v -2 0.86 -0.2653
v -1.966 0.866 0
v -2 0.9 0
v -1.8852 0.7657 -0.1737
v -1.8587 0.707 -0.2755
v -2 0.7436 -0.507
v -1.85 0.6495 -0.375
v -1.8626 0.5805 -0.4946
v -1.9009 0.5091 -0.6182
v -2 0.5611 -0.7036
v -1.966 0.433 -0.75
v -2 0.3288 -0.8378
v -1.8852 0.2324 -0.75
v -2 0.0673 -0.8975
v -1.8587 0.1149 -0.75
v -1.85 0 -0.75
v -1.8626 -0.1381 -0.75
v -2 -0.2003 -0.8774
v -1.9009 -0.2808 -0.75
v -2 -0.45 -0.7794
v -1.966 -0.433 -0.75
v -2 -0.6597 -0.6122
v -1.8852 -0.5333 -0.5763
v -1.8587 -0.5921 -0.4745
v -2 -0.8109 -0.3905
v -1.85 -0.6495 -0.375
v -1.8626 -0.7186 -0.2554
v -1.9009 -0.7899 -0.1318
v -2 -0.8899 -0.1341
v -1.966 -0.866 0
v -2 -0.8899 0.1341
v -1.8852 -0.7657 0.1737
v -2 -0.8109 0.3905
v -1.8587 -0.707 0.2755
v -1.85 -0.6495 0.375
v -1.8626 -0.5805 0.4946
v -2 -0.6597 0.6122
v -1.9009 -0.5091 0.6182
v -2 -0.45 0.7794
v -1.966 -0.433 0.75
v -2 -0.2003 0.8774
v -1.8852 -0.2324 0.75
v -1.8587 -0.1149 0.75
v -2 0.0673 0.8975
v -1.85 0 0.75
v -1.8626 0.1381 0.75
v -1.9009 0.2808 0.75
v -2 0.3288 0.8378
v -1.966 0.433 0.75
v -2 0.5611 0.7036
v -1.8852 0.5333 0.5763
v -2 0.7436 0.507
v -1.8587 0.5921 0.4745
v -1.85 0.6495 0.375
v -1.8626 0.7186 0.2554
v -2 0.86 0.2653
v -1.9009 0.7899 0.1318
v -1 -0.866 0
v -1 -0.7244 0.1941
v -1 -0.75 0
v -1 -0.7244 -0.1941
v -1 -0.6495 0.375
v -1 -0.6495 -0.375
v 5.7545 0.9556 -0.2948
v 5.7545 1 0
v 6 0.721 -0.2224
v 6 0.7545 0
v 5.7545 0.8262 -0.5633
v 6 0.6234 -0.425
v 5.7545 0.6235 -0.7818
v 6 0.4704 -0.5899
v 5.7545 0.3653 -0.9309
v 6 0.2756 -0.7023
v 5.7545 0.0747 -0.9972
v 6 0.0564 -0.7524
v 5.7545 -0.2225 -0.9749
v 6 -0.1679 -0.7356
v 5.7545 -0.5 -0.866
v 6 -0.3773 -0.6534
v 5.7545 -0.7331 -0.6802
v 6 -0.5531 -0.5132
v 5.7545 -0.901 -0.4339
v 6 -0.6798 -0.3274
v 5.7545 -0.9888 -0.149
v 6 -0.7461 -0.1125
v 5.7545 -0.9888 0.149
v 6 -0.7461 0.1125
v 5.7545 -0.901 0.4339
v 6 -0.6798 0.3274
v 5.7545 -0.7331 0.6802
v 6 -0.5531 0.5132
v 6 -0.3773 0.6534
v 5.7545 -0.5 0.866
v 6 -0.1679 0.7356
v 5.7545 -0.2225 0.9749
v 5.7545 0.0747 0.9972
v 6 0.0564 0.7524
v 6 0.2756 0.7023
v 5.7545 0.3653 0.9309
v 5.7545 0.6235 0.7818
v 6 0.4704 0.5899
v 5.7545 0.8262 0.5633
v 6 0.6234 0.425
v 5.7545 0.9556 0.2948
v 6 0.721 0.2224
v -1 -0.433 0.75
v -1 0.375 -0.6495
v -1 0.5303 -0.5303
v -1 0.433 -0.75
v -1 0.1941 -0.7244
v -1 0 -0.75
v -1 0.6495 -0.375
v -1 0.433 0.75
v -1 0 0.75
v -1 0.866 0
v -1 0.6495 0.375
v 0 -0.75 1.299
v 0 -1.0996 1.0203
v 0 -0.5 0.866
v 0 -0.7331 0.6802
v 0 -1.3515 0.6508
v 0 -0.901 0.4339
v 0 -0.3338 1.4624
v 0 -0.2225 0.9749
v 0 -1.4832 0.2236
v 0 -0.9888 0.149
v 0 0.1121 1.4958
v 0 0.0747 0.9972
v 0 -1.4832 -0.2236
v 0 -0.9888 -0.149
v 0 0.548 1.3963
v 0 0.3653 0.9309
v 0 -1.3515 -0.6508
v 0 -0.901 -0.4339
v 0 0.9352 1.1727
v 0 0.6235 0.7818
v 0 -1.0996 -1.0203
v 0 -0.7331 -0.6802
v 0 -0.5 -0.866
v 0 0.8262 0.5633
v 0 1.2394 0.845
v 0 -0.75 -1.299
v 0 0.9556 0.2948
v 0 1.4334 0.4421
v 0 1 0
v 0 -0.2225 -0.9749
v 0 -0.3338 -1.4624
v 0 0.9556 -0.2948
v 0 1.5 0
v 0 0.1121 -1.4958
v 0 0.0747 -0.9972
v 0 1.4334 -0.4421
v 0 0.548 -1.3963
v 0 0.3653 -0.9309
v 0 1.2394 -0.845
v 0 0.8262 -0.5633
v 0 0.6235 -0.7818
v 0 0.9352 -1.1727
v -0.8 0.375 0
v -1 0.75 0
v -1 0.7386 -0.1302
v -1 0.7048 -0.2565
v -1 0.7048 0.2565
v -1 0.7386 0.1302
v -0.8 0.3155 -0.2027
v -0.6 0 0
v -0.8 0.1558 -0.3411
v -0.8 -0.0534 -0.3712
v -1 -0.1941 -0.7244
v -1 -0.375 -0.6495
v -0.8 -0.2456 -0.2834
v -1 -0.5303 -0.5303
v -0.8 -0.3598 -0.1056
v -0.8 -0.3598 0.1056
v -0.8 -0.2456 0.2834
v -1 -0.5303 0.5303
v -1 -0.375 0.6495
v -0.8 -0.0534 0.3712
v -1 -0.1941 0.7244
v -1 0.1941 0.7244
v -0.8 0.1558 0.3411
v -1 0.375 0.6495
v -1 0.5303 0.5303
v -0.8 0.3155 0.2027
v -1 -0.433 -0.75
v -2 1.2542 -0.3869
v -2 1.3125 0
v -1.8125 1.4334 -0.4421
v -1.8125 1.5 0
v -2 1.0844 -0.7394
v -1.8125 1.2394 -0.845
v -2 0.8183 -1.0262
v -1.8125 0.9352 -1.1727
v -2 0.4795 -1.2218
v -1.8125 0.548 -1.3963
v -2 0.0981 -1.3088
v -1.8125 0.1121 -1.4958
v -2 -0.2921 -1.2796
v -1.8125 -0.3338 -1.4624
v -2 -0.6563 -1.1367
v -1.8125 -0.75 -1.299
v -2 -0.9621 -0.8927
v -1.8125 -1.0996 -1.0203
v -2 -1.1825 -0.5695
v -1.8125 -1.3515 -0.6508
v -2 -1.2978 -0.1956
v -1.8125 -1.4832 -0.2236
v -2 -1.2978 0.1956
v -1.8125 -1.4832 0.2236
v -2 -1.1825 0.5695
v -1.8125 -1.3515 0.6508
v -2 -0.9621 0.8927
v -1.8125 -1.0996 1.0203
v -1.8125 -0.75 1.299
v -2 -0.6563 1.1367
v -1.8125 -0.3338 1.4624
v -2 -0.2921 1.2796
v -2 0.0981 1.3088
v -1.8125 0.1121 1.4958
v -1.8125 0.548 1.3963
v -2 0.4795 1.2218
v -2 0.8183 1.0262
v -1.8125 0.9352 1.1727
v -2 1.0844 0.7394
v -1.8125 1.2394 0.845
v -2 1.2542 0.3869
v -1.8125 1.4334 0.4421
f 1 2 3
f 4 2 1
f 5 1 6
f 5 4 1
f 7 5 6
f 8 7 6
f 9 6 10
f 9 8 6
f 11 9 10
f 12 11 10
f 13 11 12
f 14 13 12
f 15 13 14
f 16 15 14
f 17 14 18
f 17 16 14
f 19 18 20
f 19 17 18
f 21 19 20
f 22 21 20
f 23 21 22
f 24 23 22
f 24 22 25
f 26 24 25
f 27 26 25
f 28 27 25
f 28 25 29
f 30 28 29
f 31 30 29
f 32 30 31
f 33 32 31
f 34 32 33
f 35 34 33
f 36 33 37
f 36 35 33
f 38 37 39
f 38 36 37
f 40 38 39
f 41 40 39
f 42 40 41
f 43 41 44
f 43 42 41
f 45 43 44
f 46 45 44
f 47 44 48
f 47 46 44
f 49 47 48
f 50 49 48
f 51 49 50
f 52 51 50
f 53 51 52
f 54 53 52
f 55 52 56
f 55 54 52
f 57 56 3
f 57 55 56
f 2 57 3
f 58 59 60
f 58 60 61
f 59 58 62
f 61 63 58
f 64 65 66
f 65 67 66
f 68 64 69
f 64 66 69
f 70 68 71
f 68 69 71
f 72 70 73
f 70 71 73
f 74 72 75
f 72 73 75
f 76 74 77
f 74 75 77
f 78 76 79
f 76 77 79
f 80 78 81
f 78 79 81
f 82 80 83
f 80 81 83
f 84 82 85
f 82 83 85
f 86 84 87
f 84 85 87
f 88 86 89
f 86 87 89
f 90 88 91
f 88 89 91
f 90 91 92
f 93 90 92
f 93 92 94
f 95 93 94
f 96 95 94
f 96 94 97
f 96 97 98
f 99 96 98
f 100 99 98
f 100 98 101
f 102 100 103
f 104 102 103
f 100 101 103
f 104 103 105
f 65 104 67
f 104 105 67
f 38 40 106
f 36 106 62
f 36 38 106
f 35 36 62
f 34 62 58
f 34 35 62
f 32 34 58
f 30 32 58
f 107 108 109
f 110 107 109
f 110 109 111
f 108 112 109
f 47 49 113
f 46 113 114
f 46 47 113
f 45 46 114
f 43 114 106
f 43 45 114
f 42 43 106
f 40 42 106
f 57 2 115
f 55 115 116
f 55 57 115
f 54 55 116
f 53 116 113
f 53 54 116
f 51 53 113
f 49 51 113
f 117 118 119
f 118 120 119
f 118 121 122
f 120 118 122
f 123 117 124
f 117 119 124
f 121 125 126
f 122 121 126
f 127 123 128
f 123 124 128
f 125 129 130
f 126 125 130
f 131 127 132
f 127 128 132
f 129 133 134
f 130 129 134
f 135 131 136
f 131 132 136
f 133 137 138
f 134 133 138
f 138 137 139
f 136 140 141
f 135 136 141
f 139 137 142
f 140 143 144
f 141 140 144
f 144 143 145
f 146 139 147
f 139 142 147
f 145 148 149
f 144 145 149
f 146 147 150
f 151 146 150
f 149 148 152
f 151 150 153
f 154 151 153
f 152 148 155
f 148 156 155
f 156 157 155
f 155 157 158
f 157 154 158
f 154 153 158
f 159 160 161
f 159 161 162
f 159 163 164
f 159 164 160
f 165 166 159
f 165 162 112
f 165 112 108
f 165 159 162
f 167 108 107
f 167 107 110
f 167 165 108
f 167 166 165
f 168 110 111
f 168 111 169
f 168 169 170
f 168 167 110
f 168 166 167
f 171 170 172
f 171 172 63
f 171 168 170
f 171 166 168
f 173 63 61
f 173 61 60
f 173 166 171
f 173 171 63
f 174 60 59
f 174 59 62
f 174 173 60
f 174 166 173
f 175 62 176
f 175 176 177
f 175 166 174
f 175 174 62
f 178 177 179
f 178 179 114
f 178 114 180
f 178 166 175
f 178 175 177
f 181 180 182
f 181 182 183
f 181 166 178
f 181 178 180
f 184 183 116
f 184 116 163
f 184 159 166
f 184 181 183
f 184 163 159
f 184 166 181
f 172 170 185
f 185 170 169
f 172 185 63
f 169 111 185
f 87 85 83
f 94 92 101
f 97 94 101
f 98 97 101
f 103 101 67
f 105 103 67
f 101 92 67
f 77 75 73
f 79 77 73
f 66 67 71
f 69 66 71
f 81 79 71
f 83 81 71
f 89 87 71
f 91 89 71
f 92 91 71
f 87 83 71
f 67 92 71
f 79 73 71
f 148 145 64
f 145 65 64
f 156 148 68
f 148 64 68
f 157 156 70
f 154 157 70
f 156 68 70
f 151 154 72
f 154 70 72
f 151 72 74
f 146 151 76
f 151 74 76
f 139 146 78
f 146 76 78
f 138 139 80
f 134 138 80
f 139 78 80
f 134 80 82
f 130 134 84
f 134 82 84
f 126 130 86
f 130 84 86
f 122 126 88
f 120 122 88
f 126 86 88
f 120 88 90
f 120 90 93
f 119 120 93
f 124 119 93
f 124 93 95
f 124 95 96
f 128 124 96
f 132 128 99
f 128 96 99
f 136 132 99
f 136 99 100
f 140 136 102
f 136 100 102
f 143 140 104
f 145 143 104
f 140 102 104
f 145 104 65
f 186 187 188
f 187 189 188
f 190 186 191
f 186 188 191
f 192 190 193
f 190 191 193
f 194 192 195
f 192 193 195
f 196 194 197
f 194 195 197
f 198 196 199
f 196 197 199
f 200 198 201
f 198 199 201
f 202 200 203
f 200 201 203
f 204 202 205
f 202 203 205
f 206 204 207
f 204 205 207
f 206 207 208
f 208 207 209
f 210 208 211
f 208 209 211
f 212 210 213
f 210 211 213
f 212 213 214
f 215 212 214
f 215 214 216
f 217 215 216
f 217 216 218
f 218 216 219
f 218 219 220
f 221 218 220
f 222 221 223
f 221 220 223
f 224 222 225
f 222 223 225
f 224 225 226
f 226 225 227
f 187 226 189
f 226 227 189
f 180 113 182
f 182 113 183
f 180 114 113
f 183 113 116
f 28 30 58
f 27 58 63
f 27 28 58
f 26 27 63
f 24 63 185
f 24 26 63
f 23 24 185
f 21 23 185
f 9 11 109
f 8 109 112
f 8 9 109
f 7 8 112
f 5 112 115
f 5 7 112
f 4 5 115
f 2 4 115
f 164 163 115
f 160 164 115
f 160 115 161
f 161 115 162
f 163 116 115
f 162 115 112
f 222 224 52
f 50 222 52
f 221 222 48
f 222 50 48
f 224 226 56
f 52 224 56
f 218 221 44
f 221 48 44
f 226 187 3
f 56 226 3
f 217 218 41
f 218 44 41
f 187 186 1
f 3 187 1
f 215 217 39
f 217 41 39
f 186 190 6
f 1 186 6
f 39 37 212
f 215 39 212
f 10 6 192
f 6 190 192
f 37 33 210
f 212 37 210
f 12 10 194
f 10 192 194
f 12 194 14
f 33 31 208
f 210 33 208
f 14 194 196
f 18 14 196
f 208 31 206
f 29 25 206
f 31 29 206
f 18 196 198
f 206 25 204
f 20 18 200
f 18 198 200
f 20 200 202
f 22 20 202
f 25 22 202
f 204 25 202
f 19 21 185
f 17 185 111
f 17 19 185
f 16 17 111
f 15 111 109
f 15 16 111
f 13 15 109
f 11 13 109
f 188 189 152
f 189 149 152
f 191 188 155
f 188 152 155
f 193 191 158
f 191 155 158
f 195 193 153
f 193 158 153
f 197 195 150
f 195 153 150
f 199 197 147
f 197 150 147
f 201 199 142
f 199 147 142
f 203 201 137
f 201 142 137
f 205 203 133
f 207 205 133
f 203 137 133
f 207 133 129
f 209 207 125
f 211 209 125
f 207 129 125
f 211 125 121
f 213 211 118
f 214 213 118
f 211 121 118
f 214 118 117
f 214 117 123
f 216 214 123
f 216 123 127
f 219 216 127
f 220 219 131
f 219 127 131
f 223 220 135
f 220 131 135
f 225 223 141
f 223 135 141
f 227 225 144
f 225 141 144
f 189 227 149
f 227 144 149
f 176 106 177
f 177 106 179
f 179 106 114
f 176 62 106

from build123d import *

# Parameters (mm, degrees)
CUT_EXTRUDE1_DEPTH = 1


with BuildPart() as part:
    # Sketch1 → Revolve1 (revolve)
    with BuildSketch(Plane.XY):
        Polygon((-2, 0), (-2, 1.3125), (-1.8125, 1.5), (0, 1.5), (0, 1), (5.7545, 1), (6, 0.7545), (6, 0), align=None)
    revolve(axis=Axis((6, 0, 0), (-1, 0, 0)))

    # Sketch2 → Cut-Revolve1 (revolve, cut)
    with BuildSketch(Plane.XY):
        Polygon((-2, 0), (-2, 0.9), (-1.85, 0.75), (-1, 0.75), (-0.6, 0), align=None)
    revolve(axis=Axis((-0.6, 0, 0), (-1, 0, 0)), mode=Mode.SUBTRACT)

    # Sketch3 → Cut-Extrude1 (cut)
    with BuildSketch(Plane(origin=(-2, 0, 0), x_dir=(0, 0, -1), z_dir=(1, 0, 0))):
        Polygon((-0.75, -0.433012702), (0, -0.866025404), (0.75, -0.433012702), (0.75, 0.433012702), (0, 0.866025404), (-0.75, 0.433012702), align=None)
    extrude(amount=CUT_EXTRUDE1_DEPTH, mode=Mode.SUBTRACT)


solid = part.part
